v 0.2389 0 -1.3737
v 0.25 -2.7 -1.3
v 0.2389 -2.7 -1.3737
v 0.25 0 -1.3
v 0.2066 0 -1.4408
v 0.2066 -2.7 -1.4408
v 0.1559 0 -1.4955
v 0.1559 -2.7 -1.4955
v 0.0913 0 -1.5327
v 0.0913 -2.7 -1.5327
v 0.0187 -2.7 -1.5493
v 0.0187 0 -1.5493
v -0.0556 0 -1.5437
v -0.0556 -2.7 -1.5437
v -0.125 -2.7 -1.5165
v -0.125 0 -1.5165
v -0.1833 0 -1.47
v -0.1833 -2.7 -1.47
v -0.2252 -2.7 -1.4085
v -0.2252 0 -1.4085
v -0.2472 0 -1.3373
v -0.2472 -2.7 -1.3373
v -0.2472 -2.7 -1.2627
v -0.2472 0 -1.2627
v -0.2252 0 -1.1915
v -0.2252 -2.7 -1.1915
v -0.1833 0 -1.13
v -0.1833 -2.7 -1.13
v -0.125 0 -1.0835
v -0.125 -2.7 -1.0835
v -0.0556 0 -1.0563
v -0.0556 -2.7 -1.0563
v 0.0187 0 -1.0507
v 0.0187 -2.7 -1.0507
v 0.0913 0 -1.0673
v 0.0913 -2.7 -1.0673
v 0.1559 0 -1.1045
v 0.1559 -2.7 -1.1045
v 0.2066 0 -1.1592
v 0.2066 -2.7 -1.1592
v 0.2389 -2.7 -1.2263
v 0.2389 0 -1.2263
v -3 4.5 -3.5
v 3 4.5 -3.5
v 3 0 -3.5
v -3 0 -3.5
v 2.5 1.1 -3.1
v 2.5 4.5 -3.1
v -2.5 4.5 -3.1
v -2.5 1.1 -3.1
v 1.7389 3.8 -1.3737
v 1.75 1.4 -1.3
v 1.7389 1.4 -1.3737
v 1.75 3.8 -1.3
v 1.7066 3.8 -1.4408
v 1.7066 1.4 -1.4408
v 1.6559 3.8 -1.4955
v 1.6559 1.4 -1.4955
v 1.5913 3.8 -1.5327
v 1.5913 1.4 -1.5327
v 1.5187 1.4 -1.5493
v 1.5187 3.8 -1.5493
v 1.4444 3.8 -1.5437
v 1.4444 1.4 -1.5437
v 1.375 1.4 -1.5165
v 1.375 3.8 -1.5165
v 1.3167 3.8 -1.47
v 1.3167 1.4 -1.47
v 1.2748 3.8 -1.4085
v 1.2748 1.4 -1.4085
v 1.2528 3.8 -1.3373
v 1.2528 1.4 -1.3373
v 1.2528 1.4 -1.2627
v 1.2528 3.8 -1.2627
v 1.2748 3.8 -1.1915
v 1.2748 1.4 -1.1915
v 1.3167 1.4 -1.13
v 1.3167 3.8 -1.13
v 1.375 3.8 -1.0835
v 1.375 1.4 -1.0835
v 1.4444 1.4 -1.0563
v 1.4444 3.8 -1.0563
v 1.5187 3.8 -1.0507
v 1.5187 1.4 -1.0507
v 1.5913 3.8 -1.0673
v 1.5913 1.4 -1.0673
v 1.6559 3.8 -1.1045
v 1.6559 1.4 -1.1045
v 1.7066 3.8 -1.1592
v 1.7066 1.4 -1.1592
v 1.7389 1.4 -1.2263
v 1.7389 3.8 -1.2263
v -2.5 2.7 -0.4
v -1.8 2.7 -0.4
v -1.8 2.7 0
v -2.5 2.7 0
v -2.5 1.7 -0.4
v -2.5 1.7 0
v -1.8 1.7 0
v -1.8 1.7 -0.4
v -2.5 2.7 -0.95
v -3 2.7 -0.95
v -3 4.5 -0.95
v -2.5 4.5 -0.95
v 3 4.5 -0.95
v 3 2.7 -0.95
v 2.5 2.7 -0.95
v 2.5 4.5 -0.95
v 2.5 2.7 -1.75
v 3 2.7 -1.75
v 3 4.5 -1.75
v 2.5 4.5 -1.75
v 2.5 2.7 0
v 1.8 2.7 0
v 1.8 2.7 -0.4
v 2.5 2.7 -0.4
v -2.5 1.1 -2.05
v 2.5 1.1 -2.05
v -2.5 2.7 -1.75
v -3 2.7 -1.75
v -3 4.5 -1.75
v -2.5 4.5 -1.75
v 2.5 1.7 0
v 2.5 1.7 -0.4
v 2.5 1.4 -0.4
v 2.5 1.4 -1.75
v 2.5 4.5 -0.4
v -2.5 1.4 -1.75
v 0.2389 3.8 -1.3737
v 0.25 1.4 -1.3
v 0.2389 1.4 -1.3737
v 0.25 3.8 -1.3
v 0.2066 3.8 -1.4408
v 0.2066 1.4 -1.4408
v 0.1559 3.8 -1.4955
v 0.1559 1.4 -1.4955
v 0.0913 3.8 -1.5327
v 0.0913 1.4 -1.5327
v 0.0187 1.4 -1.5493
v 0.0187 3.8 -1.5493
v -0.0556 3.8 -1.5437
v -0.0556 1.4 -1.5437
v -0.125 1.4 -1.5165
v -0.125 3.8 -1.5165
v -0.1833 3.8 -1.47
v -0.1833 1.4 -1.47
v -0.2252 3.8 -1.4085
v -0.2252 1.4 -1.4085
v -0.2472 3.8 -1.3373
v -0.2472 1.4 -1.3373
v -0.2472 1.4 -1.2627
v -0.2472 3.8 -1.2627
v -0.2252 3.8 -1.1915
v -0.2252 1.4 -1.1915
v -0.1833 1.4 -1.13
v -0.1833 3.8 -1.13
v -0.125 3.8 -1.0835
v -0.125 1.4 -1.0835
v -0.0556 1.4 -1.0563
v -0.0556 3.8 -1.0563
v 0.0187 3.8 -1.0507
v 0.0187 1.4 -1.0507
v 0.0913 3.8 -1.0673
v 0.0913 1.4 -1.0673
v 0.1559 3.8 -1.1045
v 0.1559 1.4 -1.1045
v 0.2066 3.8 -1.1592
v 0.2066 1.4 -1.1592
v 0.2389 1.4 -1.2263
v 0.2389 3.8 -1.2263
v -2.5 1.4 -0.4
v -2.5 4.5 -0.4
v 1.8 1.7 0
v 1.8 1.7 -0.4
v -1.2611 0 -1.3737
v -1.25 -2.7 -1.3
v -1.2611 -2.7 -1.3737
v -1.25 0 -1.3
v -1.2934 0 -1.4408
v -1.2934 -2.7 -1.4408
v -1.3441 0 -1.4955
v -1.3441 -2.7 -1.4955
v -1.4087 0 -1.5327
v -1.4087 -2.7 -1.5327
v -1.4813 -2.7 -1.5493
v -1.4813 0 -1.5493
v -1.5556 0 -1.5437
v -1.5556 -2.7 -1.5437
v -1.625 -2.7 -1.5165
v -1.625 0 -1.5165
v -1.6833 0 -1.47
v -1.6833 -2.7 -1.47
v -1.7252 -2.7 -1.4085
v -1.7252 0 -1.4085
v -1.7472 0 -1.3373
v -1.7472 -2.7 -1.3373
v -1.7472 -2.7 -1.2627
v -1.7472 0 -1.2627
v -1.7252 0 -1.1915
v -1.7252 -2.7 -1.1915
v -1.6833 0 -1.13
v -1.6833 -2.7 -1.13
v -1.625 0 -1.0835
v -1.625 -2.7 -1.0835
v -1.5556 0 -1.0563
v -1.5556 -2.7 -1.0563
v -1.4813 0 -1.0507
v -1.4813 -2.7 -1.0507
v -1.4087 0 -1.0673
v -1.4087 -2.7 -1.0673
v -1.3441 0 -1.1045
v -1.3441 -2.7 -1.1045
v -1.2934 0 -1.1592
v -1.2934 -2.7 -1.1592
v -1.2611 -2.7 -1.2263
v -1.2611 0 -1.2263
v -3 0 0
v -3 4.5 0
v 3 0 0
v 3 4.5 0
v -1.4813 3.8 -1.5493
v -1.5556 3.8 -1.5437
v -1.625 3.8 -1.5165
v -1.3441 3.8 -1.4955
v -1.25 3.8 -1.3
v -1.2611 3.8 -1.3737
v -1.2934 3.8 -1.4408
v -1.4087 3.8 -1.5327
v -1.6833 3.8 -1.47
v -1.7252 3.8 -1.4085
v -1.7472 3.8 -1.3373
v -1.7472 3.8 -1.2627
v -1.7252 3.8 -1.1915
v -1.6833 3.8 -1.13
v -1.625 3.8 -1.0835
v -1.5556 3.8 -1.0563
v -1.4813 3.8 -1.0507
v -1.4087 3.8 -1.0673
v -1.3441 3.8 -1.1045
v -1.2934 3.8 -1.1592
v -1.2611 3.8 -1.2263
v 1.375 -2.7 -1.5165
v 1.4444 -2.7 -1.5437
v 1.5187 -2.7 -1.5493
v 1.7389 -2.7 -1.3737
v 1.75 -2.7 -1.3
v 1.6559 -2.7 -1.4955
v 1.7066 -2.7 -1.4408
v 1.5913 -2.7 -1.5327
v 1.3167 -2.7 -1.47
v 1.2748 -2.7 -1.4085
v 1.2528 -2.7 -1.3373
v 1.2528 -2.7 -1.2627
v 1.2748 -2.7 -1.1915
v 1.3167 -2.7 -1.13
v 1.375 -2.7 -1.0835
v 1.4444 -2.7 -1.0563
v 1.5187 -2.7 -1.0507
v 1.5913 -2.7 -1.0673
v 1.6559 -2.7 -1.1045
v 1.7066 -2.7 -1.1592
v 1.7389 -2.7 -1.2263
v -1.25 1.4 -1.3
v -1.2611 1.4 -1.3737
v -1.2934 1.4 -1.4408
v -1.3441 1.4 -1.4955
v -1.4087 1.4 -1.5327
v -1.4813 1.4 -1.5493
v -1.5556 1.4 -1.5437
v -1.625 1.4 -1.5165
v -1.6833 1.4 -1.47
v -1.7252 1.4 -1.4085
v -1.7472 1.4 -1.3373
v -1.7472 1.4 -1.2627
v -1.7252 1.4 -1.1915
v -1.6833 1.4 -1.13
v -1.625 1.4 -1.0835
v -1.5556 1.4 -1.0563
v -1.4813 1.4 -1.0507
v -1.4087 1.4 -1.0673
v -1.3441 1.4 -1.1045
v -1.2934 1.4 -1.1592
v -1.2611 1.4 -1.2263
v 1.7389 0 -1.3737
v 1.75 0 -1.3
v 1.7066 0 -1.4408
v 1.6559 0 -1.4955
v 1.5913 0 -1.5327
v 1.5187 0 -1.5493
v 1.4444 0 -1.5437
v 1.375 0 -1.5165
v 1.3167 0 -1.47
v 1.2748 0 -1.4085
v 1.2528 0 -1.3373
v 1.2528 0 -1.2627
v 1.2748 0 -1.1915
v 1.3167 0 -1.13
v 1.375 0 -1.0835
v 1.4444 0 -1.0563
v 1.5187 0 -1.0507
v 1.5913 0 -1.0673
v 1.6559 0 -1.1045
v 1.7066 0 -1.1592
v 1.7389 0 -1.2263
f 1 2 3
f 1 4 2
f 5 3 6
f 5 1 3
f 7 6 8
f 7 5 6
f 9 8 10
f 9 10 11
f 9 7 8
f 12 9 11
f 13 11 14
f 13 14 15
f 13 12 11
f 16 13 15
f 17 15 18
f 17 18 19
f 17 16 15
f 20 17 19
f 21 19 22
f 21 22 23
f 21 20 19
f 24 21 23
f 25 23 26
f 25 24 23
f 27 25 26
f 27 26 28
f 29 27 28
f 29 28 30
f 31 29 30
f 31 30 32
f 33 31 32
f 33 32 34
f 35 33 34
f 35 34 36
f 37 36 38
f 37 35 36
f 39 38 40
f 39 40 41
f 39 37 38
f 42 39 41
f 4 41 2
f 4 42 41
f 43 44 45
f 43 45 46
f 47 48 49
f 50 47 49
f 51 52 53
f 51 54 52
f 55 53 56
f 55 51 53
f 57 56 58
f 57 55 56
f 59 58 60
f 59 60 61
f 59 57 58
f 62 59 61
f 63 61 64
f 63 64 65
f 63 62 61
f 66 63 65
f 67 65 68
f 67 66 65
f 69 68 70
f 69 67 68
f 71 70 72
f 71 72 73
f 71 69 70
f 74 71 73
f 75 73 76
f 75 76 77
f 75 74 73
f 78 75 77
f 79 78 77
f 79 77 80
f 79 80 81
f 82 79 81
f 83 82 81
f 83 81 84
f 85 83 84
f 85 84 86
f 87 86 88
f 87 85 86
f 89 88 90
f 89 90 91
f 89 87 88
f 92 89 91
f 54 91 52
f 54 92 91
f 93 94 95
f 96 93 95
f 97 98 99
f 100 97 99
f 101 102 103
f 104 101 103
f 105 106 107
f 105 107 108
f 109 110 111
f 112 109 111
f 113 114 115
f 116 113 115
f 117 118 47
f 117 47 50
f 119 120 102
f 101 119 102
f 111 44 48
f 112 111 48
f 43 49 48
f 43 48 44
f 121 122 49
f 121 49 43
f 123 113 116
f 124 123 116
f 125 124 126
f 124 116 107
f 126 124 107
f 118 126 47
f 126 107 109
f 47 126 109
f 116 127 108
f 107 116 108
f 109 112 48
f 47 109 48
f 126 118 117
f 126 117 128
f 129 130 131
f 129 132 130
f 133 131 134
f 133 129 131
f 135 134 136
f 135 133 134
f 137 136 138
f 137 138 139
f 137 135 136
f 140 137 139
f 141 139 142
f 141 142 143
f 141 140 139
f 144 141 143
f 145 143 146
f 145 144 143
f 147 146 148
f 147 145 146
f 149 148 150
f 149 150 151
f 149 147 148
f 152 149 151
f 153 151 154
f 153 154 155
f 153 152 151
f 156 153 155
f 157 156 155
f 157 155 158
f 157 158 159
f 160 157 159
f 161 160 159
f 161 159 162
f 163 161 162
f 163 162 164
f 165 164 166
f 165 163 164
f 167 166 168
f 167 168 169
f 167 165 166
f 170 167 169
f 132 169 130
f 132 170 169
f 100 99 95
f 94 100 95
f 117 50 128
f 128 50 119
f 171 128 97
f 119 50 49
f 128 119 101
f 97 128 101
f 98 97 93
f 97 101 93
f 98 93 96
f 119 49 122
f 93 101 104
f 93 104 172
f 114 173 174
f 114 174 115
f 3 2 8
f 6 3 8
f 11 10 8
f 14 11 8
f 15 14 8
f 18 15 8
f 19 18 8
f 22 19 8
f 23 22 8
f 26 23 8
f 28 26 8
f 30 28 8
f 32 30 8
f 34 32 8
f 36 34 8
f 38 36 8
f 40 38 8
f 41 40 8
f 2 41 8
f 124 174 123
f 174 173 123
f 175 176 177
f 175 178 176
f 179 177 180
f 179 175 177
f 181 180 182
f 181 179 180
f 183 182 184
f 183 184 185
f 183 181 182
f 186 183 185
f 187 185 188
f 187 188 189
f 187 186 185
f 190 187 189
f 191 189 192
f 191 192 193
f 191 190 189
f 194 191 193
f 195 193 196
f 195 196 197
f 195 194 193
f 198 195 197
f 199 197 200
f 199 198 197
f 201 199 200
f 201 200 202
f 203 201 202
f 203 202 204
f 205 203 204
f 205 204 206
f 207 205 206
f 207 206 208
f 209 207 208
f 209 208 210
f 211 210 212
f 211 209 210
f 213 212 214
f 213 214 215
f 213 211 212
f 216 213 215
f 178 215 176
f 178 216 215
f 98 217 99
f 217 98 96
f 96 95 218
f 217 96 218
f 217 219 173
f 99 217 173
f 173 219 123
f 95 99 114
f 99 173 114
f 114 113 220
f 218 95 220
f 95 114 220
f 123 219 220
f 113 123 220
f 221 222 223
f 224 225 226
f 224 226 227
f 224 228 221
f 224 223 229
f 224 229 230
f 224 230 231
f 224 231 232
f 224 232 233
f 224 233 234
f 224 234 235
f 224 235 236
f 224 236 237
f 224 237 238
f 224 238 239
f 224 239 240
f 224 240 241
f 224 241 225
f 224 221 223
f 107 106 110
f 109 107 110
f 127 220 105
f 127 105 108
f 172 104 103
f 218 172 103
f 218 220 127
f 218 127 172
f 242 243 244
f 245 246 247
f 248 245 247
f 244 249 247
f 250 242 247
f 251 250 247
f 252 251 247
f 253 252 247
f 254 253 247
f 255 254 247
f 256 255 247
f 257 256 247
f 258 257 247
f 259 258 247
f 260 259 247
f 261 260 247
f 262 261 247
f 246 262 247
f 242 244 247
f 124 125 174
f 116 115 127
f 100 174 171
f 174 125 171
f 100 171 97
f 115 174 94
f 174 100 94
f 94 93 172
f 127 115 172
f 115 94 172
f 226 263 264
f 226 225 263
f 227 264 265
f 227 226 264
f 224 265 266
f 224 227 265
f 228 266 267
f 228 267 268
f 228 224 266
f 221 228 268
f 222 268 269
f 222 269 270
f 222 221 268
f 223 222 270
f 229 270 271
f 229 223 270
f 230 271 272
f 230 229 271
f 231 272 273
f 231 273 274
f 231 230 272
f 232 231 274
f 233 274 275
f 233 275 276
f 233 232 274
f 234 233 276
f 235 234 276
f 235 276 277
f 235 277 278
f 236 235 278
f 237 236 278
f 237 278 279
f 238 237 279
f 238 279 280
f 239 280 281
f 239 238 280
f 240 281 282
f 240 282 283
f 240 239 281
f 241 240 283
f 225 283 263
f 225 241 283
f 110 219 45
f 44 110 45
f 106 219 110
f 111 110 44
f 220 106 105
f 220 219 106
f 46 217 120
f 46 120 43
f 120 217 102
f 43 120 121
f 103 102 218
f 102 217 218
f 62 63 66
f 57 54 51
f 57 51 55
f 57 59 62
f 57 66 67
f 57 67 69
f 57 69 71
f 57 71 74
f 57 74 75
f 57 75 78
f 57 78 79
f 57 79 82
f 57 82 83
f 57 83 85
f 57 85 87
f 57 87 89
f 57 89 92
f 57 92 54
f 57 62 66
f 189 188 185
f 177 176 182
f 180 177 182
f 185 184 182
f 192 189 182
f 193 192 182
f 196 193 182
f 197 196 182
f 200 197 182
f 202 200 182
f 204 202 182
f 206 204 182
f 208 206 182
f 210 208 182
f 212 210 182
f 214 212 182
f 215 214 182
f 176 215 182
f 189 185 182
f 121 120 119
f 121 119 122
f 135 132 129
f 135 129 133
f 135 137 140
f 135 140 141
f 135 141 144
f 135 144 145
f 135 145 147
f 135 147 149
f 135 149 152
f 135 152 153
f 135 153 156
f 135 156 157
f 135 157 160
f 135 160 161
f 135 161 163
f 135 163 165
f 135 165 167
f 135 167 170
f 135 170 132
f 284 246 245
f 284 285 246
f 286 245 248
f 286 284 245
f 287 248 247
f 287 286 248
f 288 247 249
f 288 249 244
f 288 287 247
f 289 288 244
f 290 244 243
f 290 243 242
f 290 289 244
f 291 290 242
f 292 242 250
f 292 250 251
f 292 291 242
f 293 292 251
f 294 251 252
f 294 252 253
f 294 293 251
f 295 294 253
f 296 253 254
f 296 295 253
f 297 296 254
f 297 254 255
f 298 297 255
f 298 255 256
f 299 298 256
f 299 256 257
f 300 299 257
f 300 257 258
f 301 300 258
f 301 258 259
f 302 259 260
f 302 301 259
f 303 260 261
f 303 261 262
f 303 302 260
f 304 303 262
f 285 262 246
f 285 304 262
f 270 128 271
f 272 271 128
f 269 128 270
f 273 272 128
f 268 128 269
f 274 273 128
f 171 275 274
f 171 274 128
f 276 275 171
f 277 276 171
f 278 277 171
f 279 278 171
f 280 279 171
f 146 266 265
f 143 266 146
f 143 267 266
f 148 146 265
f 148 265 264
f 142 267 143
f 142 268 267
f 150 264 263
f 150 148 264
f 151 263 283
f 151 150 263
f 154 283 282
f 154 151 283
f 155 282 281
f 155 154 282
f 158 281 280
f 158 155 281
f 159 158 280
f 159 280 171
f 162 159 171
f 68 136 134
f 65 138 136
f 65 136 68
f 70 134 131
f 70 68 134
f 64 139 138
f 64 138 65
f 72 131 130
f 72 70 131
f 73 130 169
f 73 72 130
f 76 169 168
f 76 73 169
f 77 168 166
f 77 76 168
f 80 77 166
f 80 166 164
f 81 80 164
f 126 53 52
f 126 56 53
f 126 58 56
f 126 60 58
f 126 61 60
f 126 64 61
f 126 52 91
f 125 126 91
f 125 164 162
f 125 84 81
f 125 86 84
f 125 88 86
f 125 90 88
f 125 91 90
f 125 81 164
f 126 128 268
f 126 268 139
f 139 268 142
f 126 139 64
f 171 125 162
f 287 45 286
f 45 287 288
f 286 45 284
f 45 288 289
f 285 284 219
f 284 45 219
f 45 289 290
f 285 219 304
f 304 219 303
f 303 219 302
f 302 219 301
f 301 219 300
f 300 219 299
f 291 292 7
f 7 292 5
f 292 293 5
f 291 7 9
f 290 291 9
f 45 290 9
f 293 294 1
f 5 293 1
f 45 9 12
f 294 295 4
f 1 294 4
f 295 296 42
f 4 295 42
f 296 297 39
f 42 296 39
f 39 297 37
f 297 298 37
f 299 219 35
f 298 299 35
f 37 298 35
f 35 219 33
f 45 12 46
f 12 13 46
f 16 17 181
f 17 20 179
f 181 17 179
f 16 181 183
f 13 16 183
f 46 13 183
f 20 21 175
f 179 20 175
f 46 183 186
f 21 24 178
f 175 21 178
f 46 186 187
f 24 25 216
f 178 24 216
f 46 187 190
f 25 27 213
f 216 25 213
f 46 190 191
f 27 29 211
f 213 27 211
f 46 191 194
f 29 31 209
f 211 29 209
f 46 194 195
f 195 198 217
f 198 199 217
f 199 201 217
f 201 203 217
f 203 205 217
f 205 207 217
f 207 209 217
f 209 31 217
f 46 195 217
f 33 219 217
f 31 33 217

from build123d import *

# Parameters (mm, degrees)
SKETCH1_W           = 3.6
SKETCH1_H           = 2.8
BOSS_EXTRUDE1_DEPTH = 0.4
SKETCH2_W           = 0.4
SKETCH2_H           = 1.8
BOSS_EXTRUDE2_DEPTH = 0.7
SKETCH3_W           = 0.4
SKETCH3_H           = 1.8
BOSS_EXTRUDE3_DEPTH = 0.7
SKETCH4_W           = 3.1
SKETCH4_H           = 2.8
BOSS_EXTRUDE4_DEPTH = 0.5
SKETCH5_W           = 5.5
SKETCH5_H           = 3.1
BOSS_EXTRUDE5_DEPTH = 1.7
SKETCH6_W           = 3.1
SKETCH6_H           = 4.5
BOSS_EXTRUDE6_DEPTH = 0.5
SKETCH7_W           = 6
SKETCH7_H           = 4.5
BOSS_EXTRUDE7_DEPTH = 0.4
SKETCH8_W           = 5
SKETCH8_H           = 2.7
CUT_EXTRUDE1_DEPTH  = 0.6
BOSS_EXTRUDE8_DEPTH = 5
CUT_EXTRUDE2_REACH  = 8
SKETCH10_W          = 0.8
SKETCH10_H          = 1.8
SKETCH11_W          = 0.8
SKETCH11_H          = 1.8
CUT_EXTRUDE3_DEPTH  = 7
SKETCH12_W          = 0.25
SKETCH12_H          = 2.7
SKETCH13_W          = 0.25
SKETCH13_H          = 2.7
SKETCH14_W          = 0.25
SKETCH14_H          = 2.7
SKETCH15_W          = 0.25
SKETCH15_H          = 2.4
SKETCH16_W          = 0.25
SKETCH16_H          = 2.4
SKETCH17_W          = 0.25
SKETCH17_H          = 2.4


with BuildPart() as part:
    # Sketch1 → Boss-Extrude1 (new body)
    with BuildSketch(Plane.XY):
        with Locations((0, 3.1)):
            Rectangle(SKETCH1_W, SKETCH1_H)
    extrude(amount=-BOSS_EXTRUDE1_DEPTH)

    # Sketch2 → Boss-Extrude2 (add)
    with BuildSketch(Plane.ZY.offset(1.8)):
        with Locations((-0.2, 3.6)):
            Rectangle(SKETCH2_W, SKETCH2_H)
    extrude(amount=BOSS_EXTRUDE2_DEPTH)

    # Sketch3 → Boss-Extrude3 (add)
    with BuildSketch(Plane(origin=(1.8, 0, 0), x_dir=(0, 0, -1), z_dir=(1, 0, 0))):
        with Locations((0.2, 3.6)):
            Rectangle(SKETCH3_W, SKETCH3_H)
    extrude(amount=BOSS_EXTRUDE3_DEPTH)

    # Sketch4 → Boss-Extrude4 (add)
    with BuildSketch(Plane(origin=(2.5, 0, 0), x_dir=(0, 0, -1), z_dir=(1, 0, 0))):
        with Locations((1.55, 3.1)):
            Rectangle(SKETCH4_W, SKETCH4_H)
    extrude(amount=BOSS_EXTRUDE4_DEPTH)

    # Sketch5 → Boss-Extrude5 (add)
    with BuildSketch(Plane.XZ.offset(-1.7)):
        with Locations((0.25, -1.55)):
            Rectangle(SKETCH5_W, SKETCH5_H)
    extrude(amount=BOSS_EXTRUDE5_DEPTH)

    # Sketch6 → Boss-Extrude6 (add)
    with BuildSketch(Plane.ZY.offset(2.5)):
        with Locations((-1.55, 2.25)):
            Rectangle(SKETCH6_W, SKETCH6_H)
    extrude(amount=BOSS_EXTRUDE6_DEPTH)

    # Sketch7 → Boss-Extrude7 (add)
    with BuildSketch(Plane(origin=(0, 0, -3.1), x_dir=(-1, 0, 0), z_dir=(0, 0, -1))):
        with Locations((0, 2.25)):
            Rectangle(SKETCH7_W, SKETCH7_H)
    extrude(amount=BOSS_EXTRUDE7_DEPTH)

    # Sketch8 → Cut-Extrude1 (cut)
    with BuildSketch(Plane(origin=(0, 1.7, 0), x_dir=(-1, 0, 0), z_dir=(0, 1, 0))):
        with Locations((0, -1.75)):
            Rectangle(SKETCH8_W, SKETCH8_H)
    extrude(amount=-CUT_EXTRUDE1_DEPTH, mode=Mode.SUBTRACT)

    # Sketch9 → Boss-Extrude8 (add)
    with BuildSketch(Plane.ZY.offset(-2.5)):
        Polygon((-0.4, 1.4), (-0.4, 1.1), (-2.05, 1.1), (-1.75, 1.4), align=None)
    extrude(amount=BOSS_EXTRUDE8_DEPTH)

    # Sketch10 → Cut-Extrude2 (cut, up to next)
    with BuildSketch(Plane(origin=(3, 0, 0), x_dir=(0, 0, -1), z_dir=(1, 0, 0)), mode=Mode.PRIVATE) as cut_extrude2_sk1:
        with Locations((1.35, 3.6)):
            Rectangle(SKETCH10_W, SKETCH10_H)
    cut_extrude2_tool1 = extrude(cut_extrude2_sk1.sketch, amount=-CUT_EXTRUDE2_REACH, mode=Mode.PRIVATE) & part.part
    add(cut_extrude2_tool1.solids().sort_by_distance((3, 3.6, -1.35))[0], mode=Mode.SUBTRACT)

    # Sketch11 → Cut-Extrude3 (cut, through all)
    with BuildSketch(Plane.ZY.offset(3)):
        with Locations((-1.35, 3.6)):
            Rectangle(SKETCH11_W, SKETCH11_H)
    extrude(amount=-CUT_EXTRUDE3_DEPTH, mode=Mode.SUBTRACT)

    # Sketch12 → Revolve1 (revolve)
    with BuildSketch(Plane(origin=(0, 0, -1.3), x_dir=(-1, 0, 0), z_dir=(0, 0, -1))):
        with Locations((1.375, -1.35)):
            Rectangle(SKETCH12_W, SKETCH12_H)
    revolve(axis=Axis((-1.5, -2.7, -1.3), (0, 1, 0)))

    # Sketch13 → Revolve2 (revolve)
    with BuildSketch(Plane(origin=(0, 0, -1.3), x_dir=(-1, 0, 0), z_dir=(0, 0, -1))):
        with Locations((-0.125, -1.35)):
            Rectangle(SKETCH13_W, SKETCH13_H)
    revolve(axis=Axis((0, -2.7, -1.3), (0, 1, 0)))

    # Sketch14 → Revolve3 (revolve)
    with BuildSketch(Plane(origin=(0, 0, -1.3), x_dir=(-1, 0, 0), z_dir=(0, 0, -1))):
        with Locations((-1.625, -1.35)):
            Rectangle(SKETCH14_W, SKETCH14_H)
    revolve(axis=Axis((1.5, -2.7, -1.3), (0, 1, 0)))

    # Sketch15 → Revolve4 (revolve)
    with BuildSketch(Plane(origin=(0, 0, -1.3), x_dir=(-1, 0, 0), z_dir=(0, 0, -1))):
        with Locations((-1.625, 2.6)):
            Rectangle(SKETCH15_W, SKETCH15_H)
    revolve(axis=Axis((1.5, 1.4, -1.3), (0, 1, 0)))

    # Sketch16 → Revolve5 (revolve)
    with BuildSketch(Plane(origin=(0, 0, -1.3), x_dir=(-1, 0, 0), z_dir=(0, 0, -1))):
        with Locations((-0.125, 2.6)):
            Rectangle(SKETCH16_W, SKETCH16_H)
    revolve(axis=Axis((0, 1.4, -1.3), (0, 1, 0)))

    # Sketch17 → Revolve6 (revolve)
    with BuildSketch(Plane(origin=(0, 0, -1.3), x_dir=(-1, 0, 0), z_dir=(0, 0, -1))):
        with Locations((1.375, 2.6)):
            Rectangle(SKETCH17_W, SKETCH17_H)
    revolve(axis=Axis((-1.5, 1.4, -1.3), (0, 1, 0)))


solid = part.part
